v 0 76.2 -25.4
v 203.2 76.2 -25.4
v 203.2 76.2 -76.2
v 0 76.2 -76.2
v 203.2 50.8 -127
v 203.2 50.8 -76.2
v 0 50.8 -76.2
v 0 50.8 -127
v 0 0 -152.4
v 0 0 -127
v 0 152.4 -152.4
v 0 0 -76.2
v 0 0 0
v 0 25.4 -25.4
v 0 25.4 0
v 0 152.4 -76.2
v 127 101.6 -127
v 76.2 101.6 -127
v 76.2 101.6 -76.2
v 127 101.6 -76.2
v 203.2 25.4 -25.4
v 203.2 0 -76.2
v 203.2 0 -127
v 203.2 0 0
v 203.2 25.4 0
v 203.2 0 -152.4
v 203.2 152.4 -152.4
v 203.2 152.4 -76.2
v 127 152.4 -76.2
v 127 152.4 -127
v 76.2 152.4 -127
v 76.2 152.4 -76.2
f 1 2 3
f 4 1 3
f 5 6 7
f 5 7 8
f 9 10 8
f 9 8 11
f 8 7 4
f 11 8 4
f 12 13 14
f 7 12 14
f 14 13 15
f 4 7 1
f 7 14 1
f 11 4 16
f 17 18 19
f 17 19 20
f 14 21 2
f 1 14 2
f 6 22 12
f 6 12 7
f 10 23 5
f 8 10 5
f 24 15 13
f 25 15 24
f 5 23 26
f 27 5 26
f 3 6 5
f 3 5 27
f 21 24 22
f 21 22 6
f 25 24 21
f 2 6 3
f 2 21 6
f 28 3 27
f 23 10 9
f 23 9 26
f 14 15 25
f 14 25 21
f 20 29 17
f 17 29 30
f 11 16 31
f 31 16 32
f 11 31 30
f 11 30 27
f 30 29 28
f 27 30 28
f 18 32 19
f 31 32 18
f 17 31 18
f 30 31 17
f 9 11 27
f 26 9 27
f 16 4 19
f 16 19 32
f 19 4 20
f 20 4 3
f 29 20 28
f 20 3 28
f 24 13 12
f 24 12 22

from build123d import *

# Parameters (mm, degrees)
SKETCH1_W           = 203.2
SKETCH1_H           = 152.4
BOSS_EXTRUDE1_DEPTH = 152.4
SKETCH2_W           = 50.8
SKETCH2_H           = 50.8
CUT_EXTRUDE1_DEPTH  = 204.2
SKETCH3_W           = 50.8
SKETCH3_H           = 50.8
CUT_EXTRUDE2_DEPTH  = 50.8


with BuildPart() as part:
    # Sketch1 → Boss-Extrude1 (new body)
    with BuildSketch(Plane.XY):
        with Locations((101.6, 76.2)):
            Rectangle(SKETCH1_W, SKETCH1_H)
    extrude(amount=-BOSS_EXTRUDE1_DEPTH)

    # Sketch2 → Cut-Extrude1 (cut, through all)
    with BuildSketch(Plane(origin=(203.2, 0, 0), x_dir=(0, 0, -1), z_dir=(1, 0, 0))):
        Polygon((0, 25.4), (25.4, 25.4), (25.4, 76.2), (76.2, 76.2), (76.2, 152.4), (0, 152.4), align=None)
        with Locations((101.6, 25.4)):
            Rectangle(SKETCH2_W, SKETCH2_H)
    extrude(amount=-CUT_EXTRUDE1_DEPTH, mode=Mode.SUBTRACT)

    # Sketch3 → Cut-Extrude2 (cut)
    with BuildSketch(Plane(origin=(0, 152.4, 0), x_dir=(1, 0, 0), z_dir=(0, 1, 0))):
        with Locations((101.6, 101.6)):
            Rectangle(SKETCH3_W, SKETCH3_H)
    extrude(amount=-CUT_EXTRUDE2_DEPTH, mode=Mode.SUBTRACT)


solid = part.part
